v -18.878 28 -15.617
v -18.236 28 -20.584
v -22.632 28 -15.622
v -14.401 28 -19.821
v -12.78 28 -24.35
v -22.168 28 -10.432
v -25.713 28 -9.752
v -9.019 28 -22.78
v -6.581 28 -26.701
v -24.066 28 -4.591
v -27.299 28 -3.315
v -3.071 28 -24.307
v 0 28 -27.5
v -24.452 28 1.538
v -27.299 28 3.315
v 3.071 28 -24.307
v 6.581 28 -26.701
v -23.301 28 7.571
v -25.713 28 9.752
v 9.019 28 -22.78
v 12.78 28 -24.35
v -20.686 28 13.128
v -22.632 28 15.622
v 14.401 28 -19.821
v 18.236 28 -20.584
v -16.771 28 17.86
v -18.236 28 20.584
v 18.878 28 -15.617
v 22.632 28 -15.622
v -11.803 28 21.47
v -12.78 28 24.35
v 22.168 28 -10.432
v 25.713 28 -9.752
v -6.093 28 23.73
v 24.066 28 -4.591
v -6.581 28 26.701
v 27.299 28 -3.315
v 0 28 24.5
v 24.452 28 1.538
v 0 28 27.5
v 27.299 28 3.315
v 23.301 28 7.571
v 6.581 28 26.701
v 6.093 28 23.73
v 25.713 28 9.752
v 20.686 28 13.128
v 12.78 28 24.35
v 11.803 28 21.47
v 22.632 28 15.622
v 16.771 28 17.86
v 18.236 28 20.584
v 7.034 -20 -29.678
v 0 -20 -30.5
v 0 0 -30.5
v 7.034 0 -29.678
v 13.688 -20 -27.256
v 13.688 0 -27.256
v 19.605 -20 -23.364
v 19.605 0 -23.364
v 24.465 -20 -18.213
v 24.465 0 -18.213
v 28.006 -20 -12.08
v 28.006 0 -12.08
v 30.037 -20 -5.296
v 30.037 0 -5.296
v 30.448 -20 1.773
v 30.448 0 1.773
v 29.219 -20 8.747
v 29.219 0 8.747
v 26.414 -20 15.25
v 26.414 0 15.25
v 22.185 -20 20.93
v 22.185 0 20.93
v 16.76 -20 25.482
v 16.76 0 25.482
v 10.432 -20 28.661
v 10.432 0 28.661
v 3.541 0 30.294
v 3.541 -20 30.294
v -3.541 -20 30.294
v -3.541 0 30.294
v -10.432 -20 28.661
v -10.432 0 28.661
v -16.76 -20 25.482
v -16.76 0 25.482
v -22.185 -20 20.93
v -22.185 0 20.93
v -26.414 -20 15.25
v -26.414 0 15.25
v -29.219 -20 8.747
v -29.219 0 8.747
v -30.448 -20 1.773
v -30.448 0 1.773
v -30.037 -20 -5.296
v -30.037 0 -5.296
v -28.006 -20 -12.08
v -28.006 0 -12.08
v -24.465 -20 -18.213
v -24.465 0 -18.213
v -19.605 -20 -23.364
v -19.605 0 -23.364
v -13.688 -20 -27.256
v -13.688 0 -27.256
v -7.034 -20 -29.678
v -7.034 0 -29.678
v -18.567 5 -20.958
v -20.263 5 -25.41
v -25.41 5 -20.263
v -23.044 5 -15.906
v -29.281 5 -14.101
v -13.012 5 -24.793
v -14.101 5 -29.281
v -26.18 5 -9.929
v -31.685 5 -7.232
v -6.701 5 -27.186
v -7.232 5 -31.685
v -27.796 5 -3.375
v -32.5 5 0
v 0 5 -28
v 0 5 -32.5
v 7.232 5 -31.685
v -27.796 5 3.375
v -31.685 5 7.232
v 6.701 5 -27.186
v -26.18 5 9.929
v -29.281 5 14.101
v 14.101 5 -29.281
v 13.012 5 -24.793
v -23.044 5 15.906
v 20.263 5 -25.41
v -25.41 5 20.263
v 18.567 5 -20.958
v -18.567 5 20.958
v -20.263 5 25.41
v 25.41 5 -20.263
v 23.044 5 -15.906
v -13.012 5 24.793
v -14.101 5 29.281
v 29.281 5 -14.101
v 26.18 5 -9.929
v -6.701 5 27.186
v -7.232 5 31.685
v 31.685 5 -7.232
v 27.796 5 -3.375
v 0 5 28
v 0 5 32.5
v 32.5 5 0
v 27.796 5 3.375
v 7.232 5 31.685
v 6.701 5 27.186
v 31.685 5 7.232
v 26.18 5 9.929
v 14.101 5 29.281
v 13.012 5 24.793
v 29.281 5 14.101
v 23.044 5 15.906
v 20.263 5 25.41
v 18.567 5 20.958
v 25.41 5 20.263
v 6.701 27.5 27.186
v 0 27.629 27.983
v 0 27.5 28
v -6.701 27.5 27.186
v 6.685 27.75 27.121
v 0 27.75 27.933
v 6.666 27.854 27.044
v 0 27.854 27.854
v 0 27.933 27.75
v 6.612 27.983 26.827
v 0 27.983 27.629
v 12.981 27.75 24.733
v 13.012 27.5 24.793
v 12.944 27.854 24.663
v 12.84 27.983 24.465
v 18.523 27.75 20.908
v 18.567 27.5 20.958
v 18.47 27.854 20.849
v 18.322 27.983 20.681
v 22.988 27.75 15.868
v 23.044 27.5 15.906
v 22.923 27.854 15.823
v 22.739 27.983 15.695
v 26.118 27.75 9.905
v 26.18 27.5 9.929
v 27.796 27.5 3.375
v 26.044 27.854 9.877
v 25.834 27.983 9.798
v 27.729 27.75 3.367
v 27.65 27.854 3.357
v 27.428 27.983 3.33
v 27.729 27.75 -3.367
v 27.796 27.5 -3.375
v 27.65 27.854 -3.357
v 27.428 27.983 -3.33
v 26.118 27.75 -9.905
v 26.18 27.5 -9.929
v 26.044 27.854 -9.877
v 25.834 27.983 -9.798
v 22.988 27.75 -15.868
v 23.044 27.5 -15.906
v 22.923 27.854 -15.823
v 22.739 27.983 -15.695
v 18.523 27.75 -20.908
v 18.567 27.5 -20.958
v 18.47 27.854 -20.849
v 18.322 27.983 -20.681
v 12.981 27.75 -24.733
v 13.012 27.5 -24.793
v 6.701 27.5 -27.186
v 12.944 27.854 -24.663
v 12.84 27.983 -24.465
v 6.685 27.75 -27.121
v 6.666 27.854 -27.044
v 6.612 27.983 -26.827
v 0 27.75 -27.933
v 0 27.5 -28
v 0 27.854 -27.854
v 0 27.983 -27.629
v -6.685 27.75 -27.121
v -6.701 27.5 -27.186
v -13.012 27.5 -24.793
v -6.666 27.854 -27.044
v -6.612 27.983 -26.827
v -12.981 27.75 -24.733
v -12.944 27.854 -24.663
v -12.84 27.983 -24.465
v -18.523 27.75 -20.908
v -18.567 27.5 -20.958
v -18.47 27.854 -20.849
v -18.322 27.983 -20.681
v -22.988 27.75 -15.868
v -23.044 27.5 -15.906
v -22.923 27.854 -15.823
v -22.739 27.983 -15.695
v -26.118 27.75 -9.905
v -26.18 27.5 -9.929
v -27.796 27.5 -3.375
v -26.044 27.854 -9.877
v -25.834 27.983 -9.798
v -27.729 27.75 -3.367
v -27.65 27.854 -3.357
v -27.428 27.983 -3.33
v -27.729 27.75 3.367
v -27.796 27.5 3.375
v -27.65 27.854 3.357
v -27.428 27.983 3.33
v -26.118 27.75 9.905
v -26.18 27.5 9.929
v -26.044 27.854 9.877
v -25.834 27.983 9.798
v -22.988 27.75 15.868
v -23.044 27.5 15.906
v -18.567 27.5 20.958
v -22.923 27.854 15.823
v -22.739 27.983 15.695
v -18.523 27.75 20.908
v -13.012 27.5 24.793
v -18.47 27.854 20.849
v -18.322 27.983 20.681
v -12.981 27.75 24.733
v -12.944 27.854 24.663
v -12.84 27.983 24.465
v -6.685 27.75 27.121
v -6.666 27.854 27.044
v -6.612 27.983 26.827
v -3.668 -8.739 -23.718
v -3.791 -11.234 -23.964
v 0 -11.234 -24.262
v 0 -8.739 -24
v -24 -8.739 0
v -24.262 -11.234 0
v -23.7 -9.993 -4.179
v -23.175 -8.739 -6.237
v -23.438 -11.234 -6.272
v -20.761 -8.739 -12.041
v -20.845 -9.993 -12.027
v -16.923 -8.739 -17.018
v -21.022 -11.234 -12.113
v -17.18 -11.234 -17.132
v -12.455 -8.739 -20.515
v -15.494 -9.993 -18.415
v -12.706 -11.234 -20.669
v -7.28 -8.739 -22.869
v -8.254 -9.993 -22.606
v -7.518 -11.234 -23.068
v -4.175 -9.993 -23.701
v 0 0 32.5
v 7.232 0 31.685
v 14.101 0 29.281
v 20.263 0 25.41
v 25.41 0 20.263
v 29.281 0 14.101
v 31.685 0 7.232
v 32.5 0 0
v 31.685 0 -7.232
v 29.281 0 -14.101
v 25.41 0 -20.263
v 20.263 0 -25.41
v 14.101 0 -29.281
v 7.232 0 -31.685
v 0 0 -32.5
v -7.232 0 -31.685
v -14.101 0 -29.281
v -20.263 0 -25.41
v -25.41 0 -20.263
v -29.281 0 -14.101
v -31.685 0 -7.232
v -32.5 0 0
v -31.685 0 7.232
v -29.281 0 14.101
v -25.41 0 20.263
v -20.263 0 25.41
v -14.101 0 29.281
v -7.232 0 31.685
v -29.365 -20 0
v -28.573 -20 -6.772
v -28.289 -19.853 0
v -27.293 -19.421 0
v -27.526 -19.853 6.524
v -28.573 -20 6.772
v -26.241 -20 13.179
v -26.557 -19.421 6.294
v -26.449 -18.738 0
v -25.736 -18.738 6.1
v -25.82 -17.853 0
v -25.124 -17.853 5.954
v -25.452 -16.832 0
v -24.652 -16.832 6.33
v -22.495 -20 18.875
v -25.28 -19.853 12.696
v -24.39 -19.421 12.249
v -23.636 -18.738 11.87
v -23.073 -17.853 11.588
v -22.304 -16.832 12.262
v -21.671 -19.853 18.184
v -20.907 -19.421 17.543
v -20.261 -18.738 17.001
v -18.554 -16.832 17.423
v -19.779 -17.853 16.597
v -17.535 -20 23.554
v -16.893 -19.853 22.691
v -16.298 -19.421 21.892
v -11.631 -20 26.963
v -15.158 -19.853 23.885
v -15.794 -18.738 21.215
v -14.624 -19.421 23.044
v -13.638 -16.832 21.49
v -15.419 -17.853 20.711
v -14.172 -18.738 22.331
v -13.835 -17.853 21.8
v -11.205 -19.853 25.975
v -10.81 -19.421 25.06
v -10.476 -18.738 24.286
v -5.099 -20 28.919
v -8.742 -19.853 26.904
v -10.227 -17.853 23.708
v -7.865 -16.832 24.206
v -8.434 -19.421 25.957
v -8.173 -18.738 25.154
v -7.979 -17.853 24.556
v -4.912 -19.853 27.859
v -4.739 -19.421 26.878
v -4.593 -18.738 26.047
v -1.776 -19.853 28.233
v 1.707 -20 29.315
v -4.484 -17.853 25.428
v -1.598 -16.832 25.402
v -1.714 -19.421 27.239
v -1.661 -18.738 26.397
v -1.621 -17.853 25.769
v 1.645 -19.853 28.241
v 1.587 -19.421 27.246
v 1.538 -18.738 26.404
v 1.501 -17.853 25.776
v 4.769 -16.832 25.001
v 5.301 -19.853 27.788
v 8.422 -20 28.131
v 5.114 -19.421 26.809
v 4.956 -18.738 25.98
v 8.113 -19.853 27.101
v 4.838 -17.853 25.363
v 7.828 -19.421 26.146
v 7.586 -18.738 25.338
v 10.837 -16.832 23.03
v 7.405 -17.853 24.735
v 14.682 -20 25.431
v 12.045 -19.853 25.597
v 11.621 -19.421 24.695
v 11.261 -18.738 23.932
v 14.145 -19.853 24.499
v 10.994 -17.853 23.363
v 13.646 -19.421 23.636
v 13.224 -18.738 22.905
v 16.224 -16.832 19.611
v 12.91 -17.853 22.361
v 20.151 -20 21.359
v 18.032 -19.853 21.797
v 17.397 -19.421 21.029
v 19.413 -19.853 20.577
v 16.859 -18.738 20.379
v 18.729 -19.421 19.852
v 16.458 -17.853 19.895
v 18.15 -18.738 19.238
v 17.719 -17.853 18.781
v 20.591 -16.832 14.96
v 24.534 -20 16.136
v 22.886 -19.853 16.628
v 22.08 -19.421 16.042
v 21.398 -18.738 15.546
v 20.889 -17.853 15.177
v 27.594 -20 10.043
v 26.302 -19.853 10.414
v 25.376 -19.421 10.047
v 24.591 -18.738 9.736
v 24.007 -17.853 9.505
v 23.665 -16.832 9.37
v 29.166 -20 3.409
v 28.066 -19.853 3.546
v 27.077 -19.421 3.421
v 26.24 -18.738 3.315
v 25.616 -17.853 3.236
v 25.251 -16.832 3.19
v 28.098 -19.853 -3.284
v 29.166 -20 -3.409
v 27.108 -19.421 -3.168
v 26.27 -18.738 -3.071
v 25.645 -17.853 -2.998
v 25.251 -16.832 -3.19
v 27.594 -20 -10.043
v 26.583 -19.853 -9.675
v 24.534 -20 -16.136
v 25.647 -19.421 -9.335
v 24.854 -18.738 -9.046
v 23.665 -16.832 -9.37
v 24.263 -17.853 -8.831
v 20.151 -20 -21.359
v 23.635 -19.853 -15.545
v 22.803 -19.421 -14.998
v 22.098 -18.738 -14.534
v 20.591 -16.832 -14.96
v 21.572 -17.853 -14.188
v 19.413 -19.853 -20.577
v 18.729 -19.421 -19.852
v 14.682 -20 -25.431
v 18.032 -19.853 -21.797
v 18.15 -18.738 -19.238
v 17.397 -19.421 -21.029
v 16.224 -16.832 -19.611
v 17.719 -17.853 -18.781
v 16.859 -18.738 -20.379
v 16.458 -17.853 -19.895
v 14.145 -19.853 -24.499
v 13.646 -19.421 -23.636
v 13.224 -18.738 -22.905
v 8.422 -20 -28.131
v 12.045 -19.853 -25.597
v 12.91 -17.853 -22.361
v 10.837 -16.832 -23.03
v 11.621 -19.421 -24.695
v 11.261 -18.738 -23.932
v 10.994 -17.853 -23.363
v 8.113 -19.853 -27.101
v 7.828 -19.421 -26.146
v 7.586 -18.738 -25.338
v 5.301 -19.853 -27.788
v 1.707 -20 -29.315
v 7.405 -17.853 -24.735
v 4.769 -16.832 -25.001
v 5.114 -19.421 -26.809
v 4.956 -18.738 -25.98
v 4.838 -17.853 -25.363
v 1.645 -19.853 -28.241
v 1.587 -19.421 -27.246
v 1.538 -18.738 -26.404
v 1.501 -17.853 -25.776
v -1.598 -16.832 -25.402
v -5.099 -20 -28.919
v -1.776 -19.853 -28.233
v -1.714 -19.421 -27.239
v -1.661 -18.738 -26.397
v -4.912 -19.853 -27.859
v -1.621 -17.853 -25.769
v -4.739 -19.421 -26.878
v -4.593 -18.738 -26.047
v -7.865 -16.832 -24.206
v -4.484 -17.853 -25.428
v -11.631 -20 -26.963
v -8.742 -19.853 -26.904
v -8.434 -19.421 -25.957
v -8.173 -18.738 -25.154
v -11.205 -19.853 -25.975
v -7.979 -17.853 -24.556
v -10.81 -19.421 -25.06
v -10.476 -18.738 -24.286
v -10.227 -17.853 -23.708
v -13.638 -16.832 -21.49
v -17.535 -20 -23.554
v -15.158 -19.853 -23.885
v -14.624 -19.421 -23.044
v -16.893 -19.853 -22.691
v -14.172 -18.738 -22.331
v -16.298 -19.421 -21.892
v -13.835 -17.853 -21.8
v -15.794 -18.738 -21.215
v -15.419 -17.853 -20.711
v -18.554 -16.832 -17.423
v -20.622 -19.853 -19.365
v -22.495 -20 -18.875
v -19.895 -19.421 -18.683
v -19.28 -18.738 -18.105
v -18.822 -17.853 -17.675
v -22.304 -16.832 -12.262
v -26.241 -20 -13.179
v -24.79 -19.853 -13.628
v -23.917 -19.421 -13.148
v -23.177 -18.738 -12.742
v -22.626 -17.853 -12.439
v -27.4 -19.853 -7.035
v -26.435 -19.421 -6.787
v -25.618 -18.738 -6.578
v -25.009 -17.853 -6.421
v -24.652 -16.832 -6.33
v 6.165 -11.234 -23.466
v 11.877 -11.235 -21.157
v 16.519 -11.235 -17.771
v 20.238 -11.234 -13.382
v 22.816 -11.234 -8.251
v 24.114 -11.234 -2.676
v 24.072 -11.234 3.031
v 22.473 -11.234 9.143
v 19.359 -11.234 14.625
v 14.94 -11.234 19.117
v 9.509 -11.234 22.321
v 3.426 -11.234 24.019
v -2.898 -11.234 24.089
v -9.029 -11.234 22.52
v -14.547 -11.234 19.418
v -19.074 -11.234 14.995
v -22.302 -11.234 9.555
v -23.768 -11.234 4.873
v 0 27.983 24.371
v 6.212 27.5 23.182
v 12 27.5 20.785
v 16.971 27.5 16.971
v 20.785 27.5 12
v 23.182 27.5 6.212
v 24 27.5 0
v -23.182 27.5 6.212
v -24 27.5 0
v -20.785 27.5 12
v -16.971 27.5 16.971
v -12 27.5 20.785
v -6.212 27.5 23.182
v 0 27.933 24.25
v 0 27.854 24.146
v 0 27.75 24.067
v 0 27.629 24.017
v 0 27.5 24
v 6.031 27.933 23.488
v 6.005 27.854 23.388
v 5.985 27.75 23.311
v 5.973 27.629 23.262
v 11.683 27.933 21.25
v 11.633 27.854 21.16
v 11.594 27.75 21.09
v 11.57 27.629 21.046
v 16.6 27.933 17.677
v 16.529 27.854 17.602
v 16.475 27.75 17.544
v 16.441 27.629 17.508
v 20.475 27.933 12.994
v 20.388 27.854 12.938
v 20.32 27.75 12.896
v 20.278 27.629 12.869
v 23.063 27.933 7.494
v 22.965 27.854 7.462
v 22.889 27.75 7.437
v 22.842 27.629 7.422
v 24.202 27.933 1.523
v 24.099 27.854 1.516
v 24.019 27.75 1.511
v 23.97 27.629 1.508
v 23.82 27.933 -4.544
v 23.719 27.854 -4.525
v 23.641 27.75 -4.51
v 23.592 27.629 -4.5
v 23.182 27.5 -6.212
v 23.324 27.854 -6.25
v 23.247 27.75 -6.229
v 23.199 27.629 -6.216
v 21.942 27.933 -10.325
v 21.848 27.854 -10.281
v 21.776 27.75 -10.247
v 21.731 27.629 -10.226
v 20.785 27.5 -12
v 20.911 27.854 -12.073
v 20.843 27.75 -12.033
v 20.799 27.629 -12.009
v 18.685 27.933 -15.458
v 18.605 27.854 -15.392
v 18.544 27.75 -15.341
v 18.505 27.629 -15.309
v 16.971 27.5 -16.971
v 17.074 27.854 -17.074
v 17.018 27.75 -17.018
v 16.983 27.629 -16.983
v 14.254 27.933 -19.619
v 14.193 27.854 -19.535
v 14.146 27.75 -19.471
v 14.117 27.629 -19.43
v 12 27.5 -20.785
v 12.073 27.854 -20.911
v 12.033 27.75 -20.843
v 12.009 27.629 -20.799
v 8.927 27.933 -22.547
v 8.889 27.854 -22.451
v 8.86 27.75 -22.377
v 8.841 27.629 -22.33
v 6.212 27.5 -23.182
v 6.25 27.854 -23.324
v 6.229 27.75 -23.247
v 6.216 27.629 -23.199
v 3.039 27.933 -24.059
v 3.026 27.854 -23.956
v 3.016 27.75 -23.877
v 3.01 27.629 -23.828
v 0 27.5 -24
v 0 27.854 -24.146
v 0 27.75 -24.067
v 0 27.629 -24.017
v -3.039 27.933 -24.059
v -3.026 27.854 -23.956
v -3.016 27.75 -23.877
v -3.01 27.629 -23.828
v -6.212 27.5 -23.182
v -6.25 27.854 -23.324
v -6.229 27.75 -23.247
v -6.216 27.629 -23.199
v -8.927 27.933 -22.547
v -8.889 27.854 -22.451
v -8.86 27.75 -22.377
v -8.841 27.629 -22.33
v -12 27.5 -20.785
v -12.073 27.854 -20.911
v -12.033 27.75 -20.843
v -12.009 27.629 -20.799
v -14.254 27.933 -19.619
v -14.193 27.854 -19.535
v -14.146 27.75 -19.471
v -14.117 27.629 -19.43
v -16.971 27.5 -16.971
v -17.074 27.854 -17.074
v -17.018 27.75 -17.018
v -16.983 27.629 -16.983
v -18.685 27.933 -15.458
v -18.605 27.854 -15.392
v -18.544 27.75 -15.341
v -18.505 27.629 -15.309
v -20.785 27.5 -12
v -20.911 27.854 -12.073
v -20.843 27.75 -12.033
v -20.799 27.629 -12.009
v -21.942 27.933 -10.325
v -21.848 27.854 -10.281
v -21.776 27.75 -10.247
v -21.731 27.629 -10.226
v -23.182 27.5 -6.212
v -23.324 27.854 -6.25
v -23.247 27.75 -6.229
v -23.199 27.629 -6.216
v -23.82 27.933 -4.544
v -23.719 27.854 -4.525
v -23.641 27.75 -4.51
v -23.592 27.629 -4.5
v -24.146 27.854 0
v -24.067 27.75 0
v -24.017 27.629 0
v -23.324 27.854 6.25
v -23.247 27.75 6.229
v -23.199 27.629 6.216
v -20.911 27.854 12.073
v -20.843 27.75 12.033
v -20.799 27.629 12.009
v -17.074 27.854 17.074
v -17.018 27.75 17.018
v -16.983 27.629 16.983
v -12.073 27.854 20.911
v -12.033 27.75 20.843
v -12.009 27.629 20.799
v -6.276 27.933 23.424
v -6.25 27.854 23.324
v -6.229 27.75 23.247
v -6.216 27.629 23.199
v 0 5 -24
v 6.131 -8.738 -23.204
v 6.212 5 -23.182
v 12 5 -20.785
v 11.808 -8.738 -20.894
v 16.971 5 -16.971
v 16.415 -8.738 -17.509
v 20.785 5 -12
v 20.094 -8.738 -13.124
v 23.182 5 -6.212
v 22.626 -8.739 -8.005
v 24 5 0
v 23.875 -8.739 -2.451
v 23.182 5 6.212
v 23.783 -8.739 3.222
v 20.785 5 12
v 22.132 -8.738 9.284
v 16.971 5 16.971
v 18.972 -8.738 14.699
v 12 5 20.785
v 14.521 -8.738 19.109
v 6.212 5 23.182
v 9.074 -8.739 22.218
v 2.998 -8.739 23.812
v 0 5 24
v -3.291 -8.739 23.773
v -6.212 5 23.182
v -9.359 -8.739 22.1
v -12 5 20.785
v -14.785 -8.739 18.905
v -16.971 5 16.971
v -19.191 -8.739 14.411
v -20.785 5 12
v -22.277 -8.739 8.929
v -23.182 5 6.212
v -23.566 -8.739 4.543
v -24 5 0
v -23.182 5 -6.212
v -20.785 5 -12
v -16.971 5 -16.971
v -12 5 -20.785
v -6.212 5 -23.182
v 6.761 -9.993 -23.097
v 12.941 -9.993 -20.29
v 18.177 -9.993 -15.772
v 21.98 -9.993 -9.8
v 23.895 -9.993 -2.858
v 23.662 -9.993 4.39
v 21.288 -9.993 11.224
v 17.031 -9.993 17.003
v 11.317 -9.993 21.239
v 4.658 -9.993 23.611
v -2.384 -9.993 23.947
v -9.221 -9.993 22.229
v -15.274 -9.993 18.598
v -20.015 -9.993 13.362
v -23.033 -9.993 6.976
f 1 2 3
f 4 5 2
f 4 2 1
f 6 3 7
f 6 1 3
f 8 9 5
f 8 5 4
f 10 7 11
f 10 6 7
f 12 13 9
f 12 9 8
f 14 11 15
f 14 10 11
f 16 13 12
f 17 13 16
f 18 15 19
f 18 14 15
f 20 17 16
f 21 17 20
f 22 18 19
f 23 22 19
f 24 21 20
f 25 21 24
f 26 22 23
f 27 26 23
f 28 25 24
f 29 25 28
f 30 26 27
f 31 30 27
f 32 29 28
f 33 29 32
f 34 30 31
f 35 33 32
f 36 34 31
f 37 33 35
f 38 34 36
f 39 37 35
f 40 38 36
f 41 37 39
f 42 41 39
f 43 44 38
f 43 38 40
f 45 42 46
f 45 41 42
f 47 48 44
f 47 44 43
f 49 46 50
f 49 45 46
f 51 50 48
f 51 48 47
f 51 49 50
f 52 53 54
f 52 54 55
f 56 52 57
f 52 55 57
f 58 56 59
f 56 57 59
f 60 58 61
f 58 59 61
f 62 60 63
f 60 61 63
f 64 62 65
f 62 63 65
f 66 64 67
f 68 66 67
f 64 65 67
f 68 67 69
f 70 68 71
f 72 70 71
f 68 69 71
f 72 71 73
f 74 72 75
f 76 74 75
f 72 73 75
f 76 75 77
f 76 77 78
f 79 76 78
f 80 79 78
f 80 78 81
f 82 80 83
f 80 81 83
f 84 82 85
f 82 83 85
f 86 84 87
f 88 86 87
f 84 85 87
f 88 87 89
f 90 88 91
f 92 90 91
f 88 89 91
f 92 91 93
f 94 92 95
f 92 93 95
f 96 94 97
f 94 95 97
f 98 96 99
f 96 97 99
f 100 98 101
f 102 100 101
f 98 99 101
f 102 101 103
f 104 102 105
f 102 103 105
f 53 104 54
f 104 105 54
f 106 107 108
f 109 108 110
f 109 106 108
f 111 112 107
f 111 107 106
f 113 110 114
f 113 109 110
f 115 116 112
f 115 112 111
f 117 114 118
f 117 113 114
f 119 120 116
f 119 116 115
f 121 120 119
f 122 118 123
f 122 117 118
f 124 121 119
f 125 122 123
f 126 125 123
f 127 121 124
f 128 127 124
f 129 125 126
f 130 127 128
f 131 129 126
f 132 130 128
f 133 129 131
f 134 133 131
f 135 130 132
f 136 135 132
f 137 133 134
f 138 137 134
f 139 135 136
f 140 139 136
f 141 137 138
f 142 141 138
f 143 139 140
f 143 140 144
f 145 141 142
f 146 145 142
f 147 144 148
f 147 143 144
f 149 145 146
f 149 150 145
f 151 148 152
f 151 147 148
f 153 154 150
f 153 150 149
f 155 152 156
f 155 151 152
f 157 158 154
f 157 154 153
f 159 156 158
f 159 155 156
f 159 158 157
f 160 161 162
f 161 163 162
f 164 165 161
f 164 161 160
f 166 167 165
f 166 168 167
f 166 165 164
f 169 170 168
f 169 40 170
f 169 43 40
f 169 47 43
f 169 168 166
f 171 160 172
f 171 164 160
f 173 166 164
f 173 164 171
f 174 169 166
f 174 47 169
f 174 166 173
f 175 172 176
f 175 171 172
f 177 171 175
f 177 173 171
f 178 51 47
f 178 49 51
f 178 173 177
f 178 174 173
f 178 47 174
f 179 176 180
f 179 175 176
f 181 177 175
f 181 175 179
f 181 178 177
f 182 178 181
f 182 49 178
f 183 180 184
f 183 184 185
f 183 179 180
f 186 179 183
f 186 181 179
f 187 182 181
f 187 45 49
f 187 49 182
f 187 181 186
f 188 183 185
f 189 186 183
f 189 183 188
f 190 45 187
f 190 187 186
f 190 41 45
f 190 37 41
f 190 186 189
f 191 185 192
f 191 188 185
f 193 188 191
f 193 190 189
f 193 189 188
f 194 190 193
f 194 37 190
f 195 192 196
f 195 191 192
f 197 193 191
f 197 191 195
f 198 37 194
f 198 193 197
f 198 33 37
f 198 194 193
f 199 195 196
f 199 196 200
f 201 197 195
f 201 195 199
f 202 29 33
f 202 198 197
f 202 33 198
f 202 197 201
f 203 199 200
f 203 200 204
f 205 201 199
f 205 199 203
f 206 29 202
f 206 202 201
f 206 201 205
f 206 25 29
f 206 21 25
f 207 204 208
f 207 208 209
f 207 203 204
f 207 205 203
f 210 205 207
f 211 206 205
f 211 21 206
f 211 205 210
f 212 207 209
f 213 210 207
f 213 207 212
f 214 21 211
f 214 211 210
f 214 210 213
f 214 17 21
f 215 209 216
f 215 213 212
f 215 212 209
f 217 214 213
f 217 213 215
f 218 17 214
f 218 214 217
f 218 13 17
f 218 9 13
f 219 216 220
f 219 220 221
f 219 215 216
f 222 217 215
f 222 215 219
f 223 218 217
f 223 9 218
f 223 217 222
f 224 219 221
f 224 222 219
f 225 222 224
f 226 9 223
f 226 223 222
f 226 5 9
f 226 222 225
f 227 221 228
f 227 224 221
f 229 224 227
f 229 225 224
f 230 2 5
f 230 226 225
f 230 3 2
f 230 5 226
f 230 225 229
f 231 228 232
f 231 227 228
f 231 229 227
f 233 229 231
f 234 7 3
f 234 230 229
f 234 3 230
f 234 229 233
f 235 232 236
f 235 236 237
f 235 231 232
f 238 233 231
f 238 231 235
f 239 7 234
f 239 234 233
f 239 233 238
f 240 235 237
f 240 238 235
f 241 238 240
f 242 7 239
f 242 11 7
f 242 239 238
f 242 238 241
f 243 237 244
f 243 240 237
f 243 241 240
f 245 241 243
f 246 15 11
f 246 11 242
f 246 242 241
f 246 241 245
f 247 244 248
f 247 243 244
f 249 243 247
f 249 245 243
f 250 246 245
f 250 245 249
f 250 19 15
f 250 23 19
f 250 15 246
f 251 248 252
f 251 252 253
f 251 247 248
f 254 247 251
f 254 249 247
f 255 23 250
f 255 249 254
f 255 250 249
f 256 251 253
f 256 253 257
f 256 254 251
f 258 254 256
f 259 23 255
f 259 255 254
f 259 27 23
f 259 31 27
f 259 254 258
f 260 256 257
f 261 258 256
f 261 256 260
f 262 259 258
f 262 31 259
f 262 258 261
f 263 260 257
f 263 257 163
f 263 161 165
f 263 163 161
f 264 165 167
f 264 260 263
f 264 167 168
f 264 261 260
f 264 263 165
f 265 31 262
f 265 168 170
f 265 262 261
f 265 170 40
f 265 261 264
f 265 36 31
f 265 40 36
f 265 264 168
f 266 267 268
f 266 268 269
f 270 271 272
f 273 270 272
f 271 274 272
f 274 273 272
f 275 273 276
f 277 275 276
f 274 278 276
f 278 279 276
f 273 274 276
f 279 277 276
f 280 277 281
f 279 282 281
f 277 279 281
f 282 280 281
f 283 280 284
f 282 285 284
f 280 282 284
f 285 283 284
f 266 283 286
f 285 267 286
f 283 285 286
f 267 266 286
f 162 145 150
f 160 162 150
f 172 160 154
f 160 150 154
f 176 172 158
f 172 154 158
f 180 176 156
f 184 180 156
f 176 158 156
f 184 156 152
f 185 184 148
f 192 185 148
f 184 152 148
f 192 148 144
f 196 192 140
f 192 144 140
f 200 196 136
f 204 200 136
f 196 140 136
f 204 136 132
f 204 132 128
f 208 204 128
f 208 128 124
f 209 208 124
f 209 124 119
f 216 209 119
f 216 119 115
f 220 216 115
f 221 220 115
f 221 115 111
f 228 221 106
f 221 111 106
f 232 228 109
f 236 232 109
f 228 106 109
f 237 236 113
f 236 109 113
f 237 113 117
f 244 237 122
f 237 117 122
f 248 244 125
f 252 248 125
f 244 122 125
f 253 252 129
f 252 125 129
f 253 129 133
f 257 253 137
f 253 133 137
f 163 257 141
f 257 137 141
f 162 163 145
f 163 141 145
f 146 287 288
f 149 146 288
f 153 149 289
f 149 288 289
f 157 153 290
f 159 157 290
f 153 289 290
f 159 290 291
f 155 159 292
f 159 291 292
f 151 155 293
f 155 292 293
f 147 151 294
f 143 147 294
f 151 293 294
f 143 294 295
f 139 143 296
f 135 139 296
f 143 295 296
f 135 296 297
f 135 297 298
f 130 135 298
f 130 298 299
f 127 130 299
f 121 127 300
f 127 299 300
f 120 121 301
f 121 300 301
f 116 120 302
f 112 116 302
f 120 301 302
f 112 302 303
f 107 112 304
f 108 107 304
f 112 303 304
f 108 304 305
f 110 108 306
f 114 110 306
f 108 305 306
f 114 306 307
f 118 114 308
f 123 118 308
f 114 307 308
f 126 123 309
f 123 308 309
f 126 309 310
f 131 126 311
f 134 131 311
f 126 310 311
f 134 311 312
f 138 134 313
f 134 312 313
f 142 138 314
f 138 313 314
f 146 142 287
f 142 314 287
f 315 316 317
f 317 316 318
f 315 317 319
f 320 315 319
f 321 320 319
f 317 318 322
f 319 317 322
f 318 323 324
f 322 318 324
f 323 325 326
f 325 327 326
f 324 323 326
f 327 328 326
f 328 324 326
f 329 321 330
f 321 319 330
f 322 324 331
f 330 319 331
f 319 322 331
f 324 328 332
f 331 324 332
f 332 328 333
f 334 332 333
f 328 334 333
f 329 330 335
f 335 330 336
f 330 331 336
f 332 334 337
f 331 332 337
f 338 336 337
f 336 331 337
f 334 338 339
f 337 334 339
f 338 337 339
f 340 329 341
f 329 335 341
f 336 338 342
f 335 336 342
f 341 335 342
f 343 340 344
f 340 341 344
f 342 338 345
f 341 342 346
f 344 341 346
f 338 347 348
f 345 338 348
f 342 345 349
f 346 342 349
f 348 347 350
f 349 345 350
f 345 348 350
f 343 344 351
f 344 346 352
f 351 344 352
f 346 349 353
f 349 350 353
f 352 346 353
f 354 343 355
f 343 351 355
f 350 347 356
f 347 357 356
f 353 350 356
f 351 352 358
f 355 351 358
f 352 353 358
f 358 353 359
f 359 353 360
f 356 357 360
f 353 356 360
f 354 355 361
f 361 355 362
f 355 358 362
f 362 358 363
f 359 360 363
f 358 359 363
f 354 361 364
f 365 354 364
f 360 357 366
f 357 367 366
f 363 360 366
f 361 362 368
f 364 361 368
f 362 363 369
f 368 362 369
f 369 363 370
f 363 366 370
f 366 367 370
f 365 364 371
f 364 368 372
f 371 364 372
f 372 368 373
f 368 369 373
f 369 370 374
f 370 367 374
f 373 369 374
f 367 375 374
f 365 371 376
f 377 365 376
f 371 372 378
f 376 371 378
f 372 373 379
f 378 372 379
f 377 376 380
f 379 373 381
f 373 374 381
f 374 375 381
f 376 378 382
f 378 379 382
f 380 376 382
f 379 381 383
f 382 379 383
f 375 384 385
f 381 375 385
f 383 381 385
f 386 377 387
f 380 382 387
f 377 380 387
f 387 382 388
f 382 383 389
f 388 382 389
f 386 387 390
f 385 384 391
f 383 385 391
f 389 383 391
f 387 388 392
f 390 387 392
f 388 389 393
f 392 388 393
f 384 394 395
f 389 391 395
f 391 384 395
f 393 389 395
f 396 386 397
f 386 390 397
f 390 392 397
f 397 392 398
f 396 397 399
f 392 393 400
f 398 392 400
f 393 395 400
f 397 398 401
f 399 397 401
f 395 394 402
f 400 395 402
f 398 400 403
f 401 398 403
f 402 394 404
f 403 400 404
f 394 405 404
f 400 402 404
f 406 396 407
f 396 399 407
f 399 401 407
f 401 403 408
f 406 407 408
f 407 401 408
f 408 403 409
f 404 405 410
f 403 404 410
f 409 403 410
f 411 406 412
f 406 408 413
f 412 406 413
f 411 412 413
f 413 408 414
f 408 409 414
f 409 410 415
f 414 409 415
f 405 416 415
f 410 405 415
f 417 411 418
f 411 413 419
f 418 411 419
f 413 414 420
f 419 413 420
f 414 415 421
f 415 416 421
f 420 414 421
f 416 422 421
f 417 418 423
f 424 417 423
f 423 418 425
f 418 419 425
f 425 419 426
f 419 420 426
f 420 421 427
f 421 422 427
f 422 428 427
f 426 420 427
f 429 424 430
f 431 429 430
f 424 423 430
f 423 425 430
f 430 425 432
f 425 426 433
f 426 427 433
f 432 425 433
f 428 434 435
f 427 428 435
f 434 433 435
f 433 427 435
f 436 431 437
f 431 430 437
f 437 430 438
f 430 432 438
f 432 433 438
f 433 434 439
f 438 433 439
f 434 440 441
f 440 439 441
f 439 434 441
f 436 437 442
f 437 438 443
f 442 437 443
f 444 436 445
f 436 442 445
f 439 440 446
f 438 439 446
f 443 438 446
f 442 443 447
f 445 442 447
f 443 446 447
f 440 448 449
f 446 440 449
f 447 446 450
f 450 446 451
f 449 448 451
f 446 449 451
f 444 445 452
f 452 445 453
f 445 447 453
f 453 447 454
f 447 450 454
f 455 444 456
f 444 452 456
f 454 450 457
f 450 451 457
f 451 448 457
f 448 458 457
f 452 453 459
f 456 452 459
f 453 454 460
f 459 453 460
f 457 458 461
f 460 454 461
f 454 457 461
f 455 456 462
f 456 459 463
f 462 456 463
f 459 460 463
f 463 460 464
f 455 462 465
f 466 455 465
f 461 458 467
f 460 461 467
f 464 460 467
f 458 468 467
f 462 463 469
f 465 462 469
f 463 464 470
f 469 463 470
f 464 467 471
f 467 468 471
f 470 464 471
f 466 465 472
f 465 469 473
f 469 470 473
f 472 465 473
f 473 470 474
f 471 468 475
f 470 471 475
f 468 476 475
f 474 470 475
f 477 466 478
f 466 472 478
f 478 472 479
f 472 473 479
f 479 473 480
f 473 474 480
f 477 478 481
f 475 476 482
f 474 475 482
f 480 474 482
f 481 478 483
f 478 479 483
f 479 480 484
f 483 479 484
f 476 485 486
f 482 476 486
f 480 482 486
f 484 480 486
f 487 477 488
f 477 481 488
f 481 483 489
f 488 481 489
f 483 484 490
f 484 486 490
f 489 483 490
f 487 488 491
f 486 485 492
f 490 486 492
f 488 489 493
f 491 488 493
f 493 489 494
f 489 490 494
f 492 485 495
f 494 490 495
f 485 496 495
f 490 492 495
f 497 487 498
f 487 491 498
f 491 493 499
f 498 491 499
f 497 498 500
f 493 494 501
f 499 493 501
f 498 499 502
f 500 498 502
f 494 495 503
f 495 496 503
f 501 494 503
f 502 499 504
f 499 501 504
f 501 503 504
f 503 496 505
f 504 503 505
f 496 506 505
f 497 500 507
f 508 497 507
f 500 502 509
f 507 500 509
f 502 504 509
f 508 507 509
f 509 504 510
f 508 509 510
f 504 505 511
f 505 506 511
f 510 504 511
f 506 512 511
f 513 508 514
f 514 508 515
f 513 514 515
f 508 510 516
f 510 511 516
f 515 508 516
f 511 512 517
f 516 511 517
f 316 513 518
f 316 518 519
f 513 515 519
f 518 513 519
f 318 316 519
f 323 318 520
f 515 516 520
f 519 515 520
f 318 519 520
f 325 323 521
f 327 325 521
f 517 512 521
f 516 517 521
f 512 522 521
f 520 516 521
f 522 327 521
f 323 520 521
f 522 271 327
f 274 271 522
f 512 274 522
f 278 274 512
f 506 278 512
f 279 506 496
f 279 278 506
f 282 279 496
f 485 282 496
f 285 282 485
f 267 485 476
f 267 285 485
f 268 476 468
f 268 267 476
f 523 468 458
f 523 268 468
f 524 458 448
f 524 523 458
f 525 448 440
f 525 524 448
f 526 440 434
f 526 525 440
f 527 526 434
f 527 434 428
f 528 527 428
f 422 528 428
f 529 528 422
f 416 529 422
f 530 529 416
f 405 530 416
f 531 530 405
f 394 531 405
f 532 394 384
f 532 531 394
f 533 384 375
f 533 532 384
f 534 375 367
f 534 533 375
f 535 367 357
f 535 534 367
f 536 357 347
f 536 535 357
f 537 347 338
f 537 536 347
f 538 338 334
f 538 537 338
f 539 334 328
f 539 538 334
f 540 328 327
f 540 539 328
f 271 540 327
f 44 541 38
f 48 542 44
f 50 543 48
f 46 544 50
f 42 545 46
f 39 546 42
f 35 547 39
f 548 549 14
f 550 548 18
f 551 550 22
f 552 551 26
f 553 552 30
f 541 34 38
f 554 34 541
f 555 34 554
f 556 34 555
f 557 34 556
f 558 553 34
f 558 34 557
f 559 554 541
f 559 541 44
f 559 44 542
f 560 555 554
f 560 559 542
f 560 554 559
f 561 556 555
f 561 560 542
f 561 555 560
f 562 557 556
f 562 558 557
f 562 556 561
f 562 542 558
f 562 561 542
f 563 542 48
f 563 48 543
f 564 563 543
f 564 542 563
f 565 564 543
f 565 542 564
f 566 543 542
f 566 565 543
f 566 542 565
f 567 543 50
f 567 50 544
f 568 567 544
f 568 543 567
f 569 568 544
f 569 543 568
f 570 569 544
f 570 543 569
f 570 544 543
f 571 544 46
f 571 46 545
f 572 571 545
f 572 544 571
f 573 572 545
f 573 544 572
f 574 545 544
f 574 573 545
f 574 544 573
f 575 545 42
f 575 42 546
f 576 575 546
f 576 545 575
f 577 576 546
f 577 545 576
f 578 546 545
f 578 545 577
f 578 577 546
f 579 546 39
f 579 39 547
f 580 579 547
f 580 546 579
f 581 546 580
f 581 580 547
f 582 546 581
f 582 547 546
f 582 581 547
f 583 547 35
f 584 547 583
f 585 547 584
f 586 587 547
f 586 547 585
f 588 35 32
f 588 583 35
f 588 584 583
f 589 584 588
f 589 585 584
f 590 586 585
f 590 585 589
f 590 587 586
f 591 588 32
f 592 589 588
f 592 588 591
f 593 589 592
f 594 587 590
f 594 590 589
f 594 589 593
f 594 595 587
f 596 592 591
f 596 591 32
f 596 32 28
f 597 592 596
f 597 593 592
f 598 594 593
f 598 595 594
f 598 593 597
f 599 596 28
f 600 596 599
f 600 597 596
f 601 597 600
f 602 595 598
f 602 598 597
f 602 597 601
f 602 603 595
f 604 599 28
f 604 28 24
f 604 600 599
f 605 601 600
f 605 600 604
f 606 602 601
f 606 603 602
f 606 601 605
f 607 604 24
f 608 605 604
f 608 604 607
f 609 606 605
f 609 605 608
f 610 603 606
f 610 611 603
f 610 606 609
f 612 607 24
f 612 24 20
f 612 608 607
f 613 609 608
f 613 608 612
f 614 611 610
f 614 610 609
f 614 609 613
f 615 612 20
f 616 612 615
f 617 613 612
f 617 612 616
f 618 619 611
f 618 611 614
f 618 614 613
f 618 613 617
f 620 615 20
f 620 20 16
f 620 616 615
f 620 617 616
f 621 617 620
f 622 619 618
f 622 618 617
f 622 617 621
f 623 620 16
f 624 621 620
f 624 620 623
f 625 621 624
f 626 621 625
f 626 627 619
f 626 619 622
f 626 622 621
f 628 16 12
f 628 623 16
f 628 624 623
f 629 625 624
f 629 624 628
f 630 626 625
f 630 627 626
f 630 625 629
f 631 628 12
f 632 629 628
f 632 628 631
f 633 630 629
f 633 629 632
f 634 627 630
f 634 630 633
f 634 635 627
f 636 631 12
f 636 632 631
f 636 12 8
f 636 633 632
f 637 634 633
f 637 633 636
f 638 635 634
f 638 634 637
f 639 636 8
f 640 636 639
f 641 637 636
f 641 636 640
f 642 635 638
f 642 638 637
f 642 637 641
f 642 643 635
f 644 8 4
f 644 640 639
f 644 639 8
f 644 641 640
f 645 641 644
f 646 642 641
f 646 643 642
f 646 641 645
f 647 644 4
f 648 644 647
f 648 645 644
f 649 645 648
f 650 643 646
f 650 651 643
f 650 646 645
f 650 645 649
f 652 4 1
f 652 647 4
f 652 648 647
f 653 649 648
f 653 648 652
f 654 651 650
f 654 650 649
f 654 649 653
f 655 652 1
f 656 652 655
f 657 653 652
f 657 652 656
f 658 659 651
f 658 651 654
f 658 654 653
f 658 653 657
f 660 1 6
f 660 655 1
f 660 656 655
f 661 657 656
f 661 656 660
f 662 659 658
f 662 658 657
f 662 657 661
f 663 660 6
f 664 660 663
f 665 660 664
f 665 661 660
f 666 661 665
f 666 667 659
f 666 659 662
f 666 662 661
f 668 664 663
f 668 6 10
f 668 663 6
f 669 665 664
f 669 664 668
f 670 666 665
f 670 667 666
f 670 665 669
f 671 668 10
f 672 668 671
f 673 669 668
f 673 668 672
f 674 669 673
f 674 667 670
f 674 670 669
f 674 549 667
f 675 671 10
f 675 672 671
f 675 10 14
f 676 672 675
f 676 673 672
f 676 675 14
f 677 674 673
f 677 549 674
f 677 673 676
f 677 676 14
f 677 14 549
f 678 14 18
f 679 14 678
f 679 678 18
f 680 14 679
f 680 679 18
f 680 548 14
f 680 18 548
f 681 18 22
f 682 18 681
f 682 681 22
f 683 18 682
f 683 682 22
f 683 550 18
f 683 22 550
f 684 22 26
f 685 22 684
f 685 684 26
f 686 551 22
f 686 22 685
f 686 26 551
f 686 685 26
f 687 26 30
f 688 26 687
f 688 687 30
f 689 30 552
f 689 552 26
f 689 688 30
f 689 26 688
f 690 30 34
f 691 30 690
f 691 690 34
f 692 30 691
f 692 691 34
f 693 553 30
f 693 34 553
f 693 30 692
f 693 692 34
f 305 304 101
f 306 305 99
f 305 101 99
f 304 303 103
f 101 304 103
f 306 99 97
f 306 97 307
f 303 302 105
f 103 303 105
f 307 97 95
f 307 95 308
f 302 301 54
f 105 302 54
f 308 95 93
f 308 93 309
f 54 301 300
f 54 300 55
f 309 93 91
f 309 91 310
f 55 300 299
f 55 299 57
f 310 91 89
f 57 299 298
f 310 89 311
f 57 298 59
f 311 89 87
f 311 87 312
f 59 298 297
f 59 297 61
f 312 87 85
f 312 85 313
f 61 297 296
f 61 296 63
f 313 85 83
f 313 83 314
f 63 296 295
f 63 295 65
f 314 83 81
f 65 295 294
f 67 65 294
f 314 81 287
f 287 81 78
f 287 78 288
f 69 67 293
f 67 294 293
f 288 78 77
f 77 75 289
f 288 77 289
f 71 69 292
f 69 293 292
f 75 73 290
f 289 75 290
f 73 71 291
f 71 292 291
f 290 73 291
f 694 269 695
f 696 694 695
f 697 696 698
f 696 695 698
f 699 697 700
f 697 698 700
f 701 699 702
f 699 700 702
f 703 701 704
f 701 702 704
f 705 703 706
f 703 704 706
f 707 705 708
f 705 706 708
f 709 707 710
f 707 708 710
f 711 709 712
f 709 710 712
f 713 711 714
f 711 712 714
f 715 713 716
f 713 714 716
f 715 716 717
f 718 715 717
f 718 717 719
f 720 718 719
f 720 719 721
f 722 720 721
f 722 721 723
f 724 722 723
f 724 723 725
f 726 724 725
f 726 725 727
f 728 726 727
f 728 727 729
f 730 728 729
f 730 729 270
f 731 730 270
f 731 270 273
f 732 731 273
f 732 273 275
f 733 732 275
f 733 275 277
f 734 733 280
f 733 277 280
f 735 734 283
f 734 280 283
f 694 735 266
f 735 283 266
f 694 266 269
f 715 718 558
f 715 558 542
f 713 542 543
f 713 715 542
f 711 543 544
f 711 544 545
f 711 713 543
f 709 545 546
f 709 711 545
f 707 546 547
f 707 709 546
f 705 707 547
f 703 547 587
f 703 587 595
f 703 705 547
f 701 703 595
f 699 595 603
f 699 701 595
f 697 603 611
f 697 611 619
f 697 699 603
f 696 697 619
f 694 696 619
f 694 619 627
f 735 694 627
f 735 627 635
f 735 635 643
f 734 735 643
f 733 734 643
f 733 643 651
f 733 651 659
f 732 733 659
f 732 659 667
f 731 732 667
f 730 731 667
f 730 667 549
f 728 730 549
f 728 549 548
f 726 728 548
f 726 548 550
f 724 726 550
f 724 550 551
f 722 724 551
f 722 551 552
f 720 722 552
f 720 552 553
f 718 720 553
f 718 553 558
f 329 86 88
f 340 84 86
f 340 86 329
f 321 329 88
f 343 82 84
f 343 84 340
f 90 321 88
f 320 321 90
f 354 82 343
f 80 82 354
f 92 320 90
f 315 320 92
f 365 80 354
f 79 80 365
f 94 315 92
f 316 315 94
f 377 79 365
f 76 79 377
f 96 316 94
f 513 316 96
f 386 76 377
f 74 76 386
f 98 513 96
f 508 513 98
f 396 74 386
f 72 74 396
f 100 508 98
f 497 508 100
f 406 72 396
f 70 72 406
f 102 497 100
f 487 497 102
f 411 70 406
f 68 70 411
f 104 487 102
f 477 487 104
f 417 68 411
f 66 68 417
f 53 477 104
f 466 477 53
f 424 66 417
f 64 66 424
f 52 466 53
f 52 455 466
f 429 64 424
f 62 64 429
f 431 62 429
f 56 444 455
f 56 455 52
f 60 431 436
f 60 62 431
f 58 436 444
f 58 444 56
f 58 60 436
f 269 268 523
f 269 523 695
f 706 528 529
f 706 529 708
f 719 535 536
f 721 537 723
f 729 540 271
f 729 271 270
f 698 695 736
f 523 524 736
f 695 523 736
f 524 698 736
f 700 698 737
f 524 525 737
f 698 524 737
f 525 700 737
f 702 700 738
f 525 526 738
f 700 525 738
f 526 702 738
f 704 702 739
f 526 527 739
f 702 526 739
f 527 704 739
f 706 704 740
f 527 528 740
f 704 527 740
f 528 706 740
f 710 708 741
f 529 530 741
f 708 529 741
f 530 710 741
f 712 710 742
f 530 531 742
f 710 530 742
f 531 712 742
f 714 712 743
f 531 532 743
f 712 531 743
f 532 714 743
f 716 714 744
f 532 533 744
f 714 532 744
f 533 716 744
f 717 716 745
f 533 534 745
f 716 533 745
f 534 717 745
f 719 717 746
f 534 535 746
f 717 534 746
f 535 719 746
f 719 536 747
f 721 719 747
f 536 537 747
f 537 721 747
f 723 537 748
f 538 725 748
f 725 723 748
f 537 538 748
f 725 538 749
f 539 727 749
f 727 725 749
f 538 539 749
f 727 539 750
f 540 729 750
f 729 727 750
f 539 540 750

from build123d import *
from build123d.topology import SkipClean

# Parameters (mm, degrees)
SKETCH1_R                = 32.5
BOSS_EXTRUDE1_DEPTH      = 5
BOSS_EXTRUDE2_DEPTH      = 15
BOSS_EXTRUDE2_DEPTH_BACK = 5
BOSS_EXTRUDE2_START      = 5
SKETCH2_R                = 30.5
CUT_EXTRUDE3_START       = 10
SKETCH3_R                = 24
CUT_EXTRUDE3_DEPTH       = 41.124844139
CUT_EXTRUDE3_DRAFT       = -12
FILLET1_R                = 4
SKETCH4_R                = 24
CUT_EXTRUDE4_DEPTH       = 49.347699015
FILLET2_R                = 12
SKETCH5_R                = 28
SKETCH5_R_2              = 24
BOSS_EXTRUDE3_DEPTH      = 23
FILLET3_R                = 0.5


with BuildPart() as part:
    # Sketch1 → Boss-Extrude1 (new body)
    with BuildSketch(Plane(origin=(0, 0, 0), x_dir=(1, 0, 0), z_dir=(0, 1, 0))):
        with Locations(Location((0, 0, 0), (0, 0, 270))):
            Circle(SKETCH1_R)
    extrude(amount=BOSS_EXTRUDE1_DEPTH)

    # Sketch2 → Boss-Extrude2 (add, two sides: drawn at the far end of the back side and taken through both)
    with BuildSketch(Plane.XZ.offset(BOSS_EXTRUDE2_START - BOSS_EXTRUDE2_DEPTH_BACK)):
        with Locations(Location((0, 0, 0), (0, 0, 270))):
            Circle(SKETCH2_R)
    extrude(amount=BOSS_EXTRUDE2_DEPTH + BOSS_EXTRUDE2_DEPTH_BACK)


with BuildPart() as cut_extrude3_tool:
    # Sketch3 → Cut-Extrude3 (with draft: the straight prism first)
    with BuildSketch(Plane(origin=(0, 0, 0), x_dir=(-1, 0, 0), z_dir=(0, -1, 0)).offset(CUT_EXTRUDE3_START)):
        Circle(SKETCH3_R)
    extrude(amount=CUT_EXTRUDE3_DEPTH)
    # Cut-Extrude3: the draft: its side faces are tilted about the plane it starts from
    cut_extrude3_sides = [cut_extrude3_tool.faces().sort_by_distance(p)[0] for p in [
        (24, -30.56242207, 0),
    ]]
    draft(cut_extrude3_sides, Plane(origin=(0, 0, 0), x_dir=(-1, 0, 0), z_dir=(0, -1, 0)).offset(CUT_EXTRUDE3_START), CUT_EXTRUDE3_DRAFT)


with BuildPart() as part_1:
    add(part.part)

    # Cut-Extrude3: cut by cut_extrude3_tool
    add(cut_extrude3_tool.part, mode=Mode.SUBTRACT)

    # Fillet1
    fillet1_edges = [part_1.edges().sort_by_distance(p)[0] for p in [
        (26.125565617, -20, 0),
    ]]
    fillet(fillet1_edges, radius=FILLET1_R)

    # Sketch4 → Cut-Extrude4 (cut, through all)
    with BuildSketch(Plane.XZ.offset(10)):
        with Locations(Location((0, 0, 0), (0, 0, 270))):
            Circle(SKETCH4_R)
    extrude(amount=-CUT_EXTRUDE4_DEPTH, mode=Mode.SUBTRACT)

    # Fillet2
    fillet2_edges = [part_1.edges().sort_by_distance(p)[0] for p in [
        (-16.970562748, -10, -16.970562748),
    ]]
    fillet(fillet2_edges, radius=FILLET2_R)

    # Sketch5 → Boss-Extrude3 (add)
    with SkipClean():  # the faces are left unmerged after this step: merging them gives an invalid solid
        with BuildSketch(Plane(origin=(0, 5, 0), x_dir=(1, 0, 0), z_dir=(0, 1, 0))):
            with Locations(Location((0, 0, 0), (0, 0, 270))):
                Circle(SKETCH5_R)
            with Locations(Location((0, 0, 0), (0, 0, 270))):
                Circle(SKETCH5_R_2, mode=Mode.SUBTRACT)
        extrude(amount=BOSS_EXTRUDE3_DEPTH)
    add(part_1.part.scale(1), mode=Mode.REPLACE)  # the faces are merged on a copy

    # Fillet3
    fillet3_edges = [part_1.edges().sort_by_distance(p)[0] for p in [
        (0, 28, -28),
        (0, 28, -24),
    ]]
    fillet(fillet3_edges, radius=FILLET3_R)


solid = part_1.part
